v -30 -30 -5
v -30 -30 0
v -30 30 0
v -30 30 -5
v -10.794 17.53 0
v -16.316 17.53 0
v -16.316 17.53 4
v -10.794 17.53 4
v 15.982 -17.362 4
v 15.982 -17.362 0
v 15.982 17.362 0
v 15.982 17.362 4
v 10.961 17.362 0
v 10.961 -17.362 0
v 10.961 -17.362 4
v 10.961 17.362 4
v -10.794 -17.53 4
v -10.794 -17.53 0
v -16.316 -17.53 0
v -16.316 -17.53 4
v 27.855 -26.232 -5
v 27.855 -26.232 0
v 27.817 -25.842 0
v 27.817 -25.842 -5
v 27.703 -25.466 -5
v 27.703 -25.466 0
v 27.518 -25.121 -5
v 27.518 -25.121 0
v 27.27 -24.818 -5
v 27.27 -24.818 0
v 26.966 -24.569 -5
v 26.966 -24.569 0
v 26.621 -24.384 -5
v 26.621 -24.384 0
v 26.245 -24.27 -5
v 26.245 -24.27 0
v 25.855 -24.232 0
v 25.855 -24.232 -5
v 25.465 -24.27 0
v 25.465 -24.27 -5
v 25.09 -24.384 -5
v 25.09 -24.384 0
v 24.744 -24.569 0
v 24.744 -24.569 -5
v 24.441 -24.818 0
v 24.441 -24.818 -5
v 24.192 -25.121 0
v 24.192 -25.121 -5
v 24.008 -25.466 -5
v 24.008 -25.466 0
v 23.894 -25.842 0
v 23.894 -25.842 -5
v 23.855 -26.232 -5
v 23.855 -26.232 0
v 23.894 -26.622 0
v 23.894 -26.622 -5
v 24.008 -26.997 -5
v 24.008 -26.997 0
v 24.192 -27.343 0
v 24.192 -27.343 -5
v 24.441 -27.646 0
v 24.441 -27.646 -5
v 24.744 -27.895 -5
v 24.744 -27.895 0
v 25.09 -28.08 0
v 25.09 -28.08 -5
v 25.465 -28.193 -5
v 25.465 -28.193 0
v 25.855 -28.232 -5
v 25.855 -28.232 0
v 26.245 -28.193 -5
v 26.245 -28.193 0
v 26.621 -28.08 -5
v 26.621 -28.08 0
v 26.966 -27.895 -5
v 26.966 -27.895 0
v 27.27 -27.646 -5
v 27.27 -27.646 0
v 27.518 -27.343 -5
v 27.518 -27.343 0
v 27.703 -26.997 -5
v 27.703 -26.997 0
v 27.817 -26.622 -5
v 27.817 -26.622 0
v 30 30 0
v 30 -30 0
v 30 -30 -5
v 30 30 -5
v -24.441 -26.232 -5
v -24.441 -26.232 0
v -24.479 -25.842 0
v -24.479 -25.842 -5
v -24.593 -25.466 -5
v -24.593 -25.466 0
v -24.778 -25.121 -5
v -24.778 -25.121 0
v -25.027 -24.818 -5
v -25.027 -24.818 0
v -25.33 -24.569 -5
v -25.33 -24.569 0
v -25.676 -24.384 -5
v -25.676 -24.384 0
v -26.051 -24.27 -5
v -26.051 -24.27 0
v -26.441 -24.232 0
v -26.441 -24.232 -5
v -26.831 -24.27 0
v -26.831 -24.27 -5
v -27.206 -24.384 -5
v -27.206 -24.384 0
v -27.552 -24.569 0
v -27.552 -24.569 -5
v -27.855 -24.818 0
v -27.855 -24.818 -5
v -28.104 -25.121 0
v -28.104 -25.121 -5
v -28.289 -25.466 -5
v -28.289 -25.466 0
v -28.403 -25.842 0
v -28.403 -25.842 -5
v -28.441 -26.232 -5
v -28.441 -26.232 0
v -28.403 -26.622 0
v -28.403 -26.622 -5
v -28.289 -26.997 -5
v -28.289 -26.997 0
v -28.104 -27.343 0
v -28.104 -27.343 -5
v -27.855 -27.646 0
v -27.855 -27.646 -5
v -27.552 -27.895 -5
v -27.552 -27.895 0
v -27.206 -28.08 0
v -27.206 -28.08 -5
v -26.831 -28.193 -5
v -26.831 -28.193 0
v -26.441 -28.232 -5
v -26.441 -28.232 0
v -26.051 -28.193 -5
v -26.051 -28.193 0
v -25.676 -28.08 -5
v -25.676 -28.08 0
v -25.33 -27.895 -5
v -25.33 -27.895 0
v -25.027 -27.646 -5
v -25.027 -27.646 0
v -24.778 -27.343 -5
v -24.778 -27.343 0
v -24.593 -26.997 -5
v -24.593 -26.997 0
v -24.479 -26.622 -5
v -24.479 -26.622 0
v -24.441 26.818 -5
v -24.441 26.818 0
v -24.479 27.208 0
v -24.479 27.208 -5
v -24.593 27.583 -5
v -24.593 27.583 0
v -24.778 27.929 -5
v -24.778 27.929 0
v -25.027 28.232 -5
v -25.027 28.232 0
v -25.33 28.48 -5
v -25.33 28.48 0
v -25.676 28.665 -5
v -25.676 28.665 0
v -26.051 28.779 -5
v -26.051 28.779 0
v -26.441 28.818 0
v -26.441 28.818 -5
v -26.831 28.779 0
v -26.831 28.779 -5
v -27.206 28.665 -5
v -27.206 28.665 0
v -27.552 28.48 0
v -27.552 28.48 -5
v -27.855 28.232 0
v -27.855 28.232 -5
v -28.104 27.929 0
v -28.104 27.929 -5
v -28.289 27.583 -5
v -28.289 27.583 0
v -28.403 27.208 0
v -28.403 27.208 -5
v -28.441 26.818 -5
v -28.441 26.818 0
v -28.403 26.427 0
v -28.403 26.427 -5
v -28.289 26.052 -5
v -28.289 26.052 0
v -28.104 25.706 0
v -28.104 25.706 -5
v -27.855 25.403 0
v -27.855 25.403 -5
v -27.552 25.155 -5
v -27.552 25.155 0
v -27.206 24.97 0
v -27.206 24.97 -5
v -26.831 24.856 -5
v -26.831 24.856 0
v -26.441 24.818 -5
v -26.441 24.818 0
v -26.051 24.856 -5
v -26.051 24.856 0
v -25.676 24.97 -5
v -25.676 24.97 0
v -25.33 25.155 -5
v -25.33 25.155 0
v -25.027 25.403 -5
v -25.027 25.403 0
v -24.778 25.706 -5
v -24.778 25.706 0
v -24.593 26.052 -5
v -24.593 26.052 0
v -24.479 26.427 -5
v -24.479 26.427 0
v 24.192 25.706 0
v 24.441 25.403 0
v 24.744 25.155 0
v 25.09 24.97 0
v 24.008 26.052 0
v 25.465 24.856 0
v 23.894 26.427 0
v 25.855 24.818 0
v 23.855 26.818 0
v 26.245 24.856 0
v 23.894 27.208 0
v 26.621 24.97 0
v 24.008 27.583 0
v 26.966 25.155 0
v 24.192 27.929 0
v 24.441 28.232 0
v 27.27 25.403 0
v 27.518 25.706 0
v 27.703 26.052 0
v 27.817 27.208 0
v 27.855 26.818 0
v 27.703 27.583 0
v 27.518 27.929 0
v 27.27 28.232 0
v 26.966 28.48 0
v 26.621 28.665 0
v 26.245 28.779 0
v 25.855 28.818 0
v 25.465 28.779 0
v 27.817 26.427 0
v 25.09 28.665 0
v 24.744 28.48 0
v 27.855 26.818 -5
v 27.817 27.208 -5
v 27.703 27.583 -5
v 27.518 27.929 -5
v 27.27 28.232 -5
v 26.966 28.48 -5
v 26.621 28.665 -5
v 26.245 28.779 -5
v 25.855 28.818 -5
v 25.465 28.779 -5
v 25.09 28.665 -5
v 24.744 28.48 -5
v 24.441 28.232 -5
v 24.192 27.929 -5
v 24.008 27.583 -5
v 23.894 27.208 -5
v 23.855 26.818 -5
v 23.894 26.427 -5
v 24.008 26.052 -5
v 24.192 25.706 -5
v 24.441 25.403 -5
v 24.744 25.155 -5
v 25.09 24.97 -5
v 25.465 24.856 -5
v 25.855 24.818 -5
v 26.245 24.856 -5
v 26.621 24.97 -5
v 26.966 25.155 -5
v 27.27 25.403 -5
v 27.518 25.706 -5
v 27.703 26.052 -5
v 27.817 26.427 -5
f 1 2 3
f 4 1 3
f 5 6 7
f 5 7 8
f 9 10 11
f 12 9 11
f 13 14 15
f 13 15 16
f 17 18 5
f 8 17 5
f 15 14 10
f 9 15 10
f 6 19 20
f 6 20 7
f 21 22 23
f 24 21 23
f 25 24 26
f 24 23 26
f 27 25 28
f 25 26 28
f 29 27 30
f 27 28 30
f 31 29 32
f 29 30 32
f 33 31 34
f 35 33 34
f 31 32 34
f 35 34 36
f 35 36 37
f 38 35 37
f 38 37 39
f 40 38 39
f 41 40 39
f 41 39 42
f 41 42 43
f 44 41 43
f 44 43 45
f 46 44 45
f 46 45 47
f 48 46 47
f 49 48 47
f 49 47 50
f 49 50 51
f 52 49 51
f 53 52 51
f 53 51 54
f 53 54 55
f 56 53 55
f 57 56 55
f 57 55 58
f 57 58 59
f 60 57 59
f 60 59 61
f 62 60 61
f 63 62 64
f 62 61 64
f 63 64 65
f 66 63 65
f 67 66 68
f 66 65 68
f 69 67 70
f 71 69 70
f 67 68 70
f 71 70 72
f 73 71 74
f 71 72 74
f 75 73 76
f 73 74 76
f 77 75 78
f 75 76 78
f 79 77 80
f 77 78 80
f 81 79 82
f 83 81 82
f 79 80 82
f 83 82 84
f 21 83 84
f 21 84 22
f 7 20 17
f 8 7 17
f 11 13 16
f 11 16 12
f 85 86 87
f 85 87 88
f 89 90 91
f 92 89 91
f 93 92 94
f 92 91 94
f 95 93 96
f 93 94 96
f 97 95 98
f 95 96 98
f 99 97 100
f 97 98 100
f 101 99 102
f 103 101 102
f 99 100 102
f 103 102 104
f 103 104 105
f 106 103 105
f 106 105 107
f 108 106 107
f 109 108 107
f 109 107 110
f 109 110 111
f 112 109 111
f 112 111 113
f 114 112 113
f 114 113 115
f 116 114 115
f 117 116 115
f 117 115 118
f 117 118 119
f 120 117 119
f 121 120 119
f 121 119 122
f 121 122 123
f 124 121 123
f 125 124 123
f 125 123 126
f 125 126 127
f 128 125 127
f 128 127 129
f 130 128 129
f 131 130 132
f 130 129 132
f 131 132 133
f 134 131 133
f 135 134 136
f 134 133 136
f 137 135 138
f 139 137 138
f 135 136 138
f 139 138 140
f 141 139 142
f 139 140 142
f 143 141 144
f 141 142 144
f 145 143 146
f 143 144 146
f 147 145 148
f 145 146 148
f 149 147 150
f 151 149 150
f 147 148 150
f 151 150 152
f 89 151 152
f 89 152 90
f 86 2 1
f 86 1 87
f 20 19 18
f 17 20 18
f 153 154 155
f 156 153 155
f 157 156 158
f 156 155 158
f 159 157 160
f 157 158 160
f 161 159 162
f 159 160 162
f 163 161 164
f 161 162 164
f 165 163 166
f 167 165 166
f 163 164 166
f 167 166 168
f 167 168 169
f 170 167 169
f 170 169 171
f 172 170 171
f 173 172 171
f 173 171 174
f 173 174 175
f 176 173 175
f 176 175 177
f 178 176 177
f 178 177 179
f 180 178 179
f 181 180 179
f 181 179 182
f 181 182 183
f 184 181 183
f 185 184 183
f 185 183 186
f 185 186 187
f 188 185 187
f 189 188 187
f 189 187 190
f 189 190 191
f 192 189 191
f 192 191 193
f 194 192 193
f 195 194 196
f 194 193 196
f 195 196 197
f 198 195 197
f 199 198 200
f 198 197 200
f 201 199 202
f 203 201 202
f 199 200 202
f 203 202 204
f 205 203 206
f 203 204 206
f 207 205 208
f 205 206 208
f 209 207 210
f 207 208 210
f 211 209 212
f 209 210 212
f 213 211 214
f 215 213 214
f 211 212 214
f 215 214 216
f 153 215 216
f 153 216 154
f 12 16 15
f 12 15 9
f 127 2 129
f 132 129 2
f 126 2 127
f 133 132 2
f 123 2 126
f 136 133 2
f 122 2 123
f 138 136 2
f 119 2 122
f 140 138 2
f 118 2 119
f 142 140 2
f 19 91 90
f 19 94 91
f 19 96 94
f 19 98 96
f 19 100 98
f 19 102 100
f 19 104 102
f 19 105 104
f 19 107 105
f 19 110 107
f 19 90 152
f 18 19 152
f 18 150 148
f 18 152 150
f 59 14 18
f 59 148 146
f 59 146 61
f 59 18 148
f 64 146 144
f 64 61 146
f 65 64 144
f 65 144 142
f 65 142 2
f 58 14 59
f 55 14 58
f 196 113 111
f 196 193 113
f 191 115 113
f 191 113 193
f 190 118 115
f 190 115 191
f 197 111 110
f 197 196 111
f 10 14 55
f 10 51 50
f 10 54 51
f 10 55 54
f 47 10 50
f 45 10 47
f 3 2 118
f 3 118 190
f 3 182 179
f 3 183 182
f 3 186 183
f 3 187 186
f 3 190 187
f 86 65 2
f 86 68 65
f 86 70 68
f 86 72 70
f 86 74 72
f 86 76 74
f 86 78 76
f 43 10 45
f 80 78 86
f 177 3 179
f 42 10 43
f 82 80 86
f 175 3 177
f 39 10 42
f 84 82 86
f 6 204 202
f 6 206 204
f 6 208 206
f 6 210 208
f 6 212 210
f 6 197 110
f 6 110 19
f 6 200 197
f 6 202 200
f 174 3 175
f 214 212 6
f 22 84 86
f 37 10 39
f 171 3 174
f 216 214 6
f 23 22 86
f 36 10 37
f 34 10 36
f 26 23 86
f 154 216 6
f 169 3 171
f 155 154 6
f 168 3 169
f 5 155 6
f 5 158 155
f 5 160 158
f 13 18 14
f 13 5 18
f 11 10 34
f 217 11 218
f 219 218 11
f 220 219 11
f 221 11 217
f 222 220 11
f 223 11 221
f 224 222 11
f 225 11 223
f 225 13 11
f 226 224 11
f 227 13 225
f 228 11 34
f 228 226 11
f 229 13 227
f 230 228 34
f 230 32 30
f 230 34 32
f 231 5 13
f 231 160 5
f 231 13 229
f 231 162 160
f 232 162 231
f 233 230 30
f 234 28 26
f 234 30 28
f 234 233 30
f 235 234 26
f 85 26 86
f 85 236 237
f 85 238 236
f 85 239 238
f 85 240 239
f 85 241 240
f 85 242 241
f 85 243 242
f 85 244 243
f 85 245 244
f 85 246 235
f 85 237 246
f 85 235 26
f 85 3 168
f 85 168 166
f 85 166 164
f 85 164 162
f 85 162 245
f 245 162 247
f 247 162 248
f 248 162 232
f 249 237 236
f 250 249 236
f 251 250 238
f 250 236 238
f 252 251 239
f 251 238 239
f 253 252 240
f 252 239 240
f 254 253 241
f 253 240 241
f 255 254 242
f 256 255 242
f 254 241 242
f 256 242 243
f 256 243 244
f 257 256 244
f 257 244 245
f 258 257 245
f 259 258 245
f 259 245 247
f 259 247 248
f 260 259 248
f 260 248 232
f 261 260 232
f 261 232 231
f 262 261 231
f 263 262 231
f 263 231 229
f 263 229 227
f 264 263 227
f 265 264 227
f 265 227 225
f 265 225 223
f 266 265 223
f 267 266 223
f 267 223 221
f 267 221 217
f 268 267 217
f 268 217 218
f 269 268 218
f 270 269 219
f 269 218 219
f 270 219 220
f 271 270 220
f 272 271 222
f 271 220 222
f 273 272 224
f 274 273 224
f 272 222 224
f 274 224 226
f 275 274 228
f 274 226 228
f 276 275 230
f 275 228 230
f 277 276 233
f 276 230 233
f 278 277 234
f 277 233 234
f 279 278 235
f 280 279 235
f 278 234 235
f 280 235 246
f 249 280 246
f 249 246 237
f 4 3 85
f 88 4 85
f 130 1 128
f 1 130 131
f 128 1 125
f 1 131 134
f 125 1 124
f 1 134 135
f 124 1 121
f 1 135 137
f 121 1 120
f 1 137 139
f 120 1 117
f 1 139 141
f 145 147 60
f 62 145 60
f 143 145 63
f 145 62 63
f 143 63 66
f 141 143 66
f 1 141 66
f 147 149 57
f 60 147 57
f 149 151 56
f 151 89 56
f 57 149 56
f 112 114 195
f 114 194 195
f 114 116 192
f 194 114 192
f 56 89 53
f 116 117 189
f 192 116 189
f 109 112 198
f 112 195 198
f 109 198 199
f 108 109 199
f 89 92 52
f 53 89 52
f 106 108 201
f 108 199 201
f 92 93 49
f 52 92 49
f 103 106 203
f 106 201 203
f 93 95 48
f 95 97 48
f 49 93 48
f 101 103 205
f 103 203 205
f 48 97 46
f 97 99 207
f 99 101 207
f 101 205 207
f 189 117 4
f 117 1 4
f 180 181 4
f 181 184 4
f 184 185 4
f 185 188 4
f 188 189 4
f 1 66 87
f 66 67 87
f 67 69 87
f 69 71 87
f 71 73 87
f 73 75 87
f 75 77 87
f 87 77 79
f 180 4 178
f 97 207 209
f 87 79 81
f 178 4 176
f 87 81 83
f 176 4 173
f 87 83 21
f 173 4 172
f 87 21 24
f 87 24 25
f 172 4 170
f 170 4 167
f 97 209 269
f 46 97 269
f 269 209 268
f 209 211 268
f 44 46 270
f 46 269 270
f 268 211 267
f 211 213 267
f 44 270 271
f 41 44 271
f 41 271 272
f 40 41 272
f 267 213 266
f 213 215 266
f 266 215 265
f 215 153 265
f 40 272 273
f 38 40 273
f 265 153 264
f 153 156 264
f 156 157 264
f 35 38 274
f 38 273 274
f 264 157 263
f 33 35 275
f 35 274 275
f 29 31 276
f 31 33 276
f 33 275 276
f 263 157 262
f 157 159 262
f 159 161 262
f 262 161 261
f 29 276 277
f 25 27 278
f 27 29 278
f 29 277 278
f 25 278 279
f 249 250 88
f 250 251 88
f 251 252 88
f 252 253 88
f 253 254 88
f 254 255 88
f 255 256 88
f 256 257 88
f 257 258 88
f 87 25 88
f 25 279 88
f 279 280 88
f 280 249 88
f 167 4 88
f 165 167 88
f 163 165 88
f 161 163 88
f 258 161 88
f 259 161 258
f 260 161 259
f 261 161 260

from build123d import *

# Parameters (mm, degrees)
SKETCH1_W           = 60
SKETCH1_H           = 60
BOSS_EXTRUDE1_DEPTH = 5
SKETCH2_R           = 2
CUT_EXTRUDE1_DEPTH  = 43.720018727
SKETCH5_R           = 2
CUT_EXTRUDE2_DEPTH  = 43.720018727
SKETCH6_R           = 2
CUT_EXTRUDE3_DEPTH  = 43.720018727
SKETCH7_R           = 2
CUT_EXTRUDE4_DEPTH  = 43.720018727
SKETCH8_W           = 5.522489043
SKETCH8_H           = 35.05943801
BOSS_EXTRUDE2_DEPTH = 4
SKETCH11_W          = 5.020444584
SKETCH11_H          = 34.724741706
BOSS_EXTRUDE3_DEPTH = 4


with BuildPart() as part:
    # Sketch1 → Boss-Extrude1 (new body)
    with BuildSketch(Plane.XY):
        Rectangle(SKETCH1_W, SKETCH1_H)
    extrude(amount=-BOSS_EXTRUDE1_DEPTH)

    # Sketch2 → Cut-Extrude1 (cut, through all)
    with BuildSketch(Plane.XY):
        with Locations((-26.441008142, 26.817541486)):
            Circle(SKETCH2_R)
    extrude(amount=-CUT_EXTRUDE1_DEPTH, mode=Mode.SUBTRACT)

    # Sketch5 → Cut-Extrude2 (cut, through all)
    with BuildSketch(Plane.XY):
        with Locations((-26.441008142, -26.231822951)):
            Circle(SKETCH5_R)
    extrude(amount=-CUT_EXTRUDE2_DEPTH, mode=Mode.SUBTRACT)

    # Sketch6 → Cut-Extrude3 (cut, through all)
    with BuildSketch(Plane.XY):
        with Locations((25.855289607, 26.817541486)):
            Circle(SKETCH6_R)
    extrude(amount=-CUT_EXTRUDE3_DEPTH, mode=Mode.SUBTRACT)

    # Sketch7 → Cut-Extrude4 (cut, through all)
    with BuildSketch(Plane.XY):
        with Locations((25.855289607, -26.231822951)):
            Circle(SKETCH7_R)
    extrude(amount=-CUT_EXTRUDE4_DEPTH, mode=Mode.SUBTRACT)

    # Sketch8 → Boss-Extrude2 (add)
    with BuildSketch(Plane.XY):
        with Locations((-13.555200377, 0)):
            Rectangle(SKETCH8_W, SKETCH8_H)
    extrude(amount=BOSS_EXTRUDE2_DEPTH)

    # Sketch11 → Boss-Extrude3 (add)
    with BuildSketch(Plane.XY):
        with Locations((13.4715263, 0)):
            Rectangle(SKETCH11_W, SKETCH11_H)
    extrude(amount=BOSS_EXTRUDE3_DEPTH)


solid = part.part
